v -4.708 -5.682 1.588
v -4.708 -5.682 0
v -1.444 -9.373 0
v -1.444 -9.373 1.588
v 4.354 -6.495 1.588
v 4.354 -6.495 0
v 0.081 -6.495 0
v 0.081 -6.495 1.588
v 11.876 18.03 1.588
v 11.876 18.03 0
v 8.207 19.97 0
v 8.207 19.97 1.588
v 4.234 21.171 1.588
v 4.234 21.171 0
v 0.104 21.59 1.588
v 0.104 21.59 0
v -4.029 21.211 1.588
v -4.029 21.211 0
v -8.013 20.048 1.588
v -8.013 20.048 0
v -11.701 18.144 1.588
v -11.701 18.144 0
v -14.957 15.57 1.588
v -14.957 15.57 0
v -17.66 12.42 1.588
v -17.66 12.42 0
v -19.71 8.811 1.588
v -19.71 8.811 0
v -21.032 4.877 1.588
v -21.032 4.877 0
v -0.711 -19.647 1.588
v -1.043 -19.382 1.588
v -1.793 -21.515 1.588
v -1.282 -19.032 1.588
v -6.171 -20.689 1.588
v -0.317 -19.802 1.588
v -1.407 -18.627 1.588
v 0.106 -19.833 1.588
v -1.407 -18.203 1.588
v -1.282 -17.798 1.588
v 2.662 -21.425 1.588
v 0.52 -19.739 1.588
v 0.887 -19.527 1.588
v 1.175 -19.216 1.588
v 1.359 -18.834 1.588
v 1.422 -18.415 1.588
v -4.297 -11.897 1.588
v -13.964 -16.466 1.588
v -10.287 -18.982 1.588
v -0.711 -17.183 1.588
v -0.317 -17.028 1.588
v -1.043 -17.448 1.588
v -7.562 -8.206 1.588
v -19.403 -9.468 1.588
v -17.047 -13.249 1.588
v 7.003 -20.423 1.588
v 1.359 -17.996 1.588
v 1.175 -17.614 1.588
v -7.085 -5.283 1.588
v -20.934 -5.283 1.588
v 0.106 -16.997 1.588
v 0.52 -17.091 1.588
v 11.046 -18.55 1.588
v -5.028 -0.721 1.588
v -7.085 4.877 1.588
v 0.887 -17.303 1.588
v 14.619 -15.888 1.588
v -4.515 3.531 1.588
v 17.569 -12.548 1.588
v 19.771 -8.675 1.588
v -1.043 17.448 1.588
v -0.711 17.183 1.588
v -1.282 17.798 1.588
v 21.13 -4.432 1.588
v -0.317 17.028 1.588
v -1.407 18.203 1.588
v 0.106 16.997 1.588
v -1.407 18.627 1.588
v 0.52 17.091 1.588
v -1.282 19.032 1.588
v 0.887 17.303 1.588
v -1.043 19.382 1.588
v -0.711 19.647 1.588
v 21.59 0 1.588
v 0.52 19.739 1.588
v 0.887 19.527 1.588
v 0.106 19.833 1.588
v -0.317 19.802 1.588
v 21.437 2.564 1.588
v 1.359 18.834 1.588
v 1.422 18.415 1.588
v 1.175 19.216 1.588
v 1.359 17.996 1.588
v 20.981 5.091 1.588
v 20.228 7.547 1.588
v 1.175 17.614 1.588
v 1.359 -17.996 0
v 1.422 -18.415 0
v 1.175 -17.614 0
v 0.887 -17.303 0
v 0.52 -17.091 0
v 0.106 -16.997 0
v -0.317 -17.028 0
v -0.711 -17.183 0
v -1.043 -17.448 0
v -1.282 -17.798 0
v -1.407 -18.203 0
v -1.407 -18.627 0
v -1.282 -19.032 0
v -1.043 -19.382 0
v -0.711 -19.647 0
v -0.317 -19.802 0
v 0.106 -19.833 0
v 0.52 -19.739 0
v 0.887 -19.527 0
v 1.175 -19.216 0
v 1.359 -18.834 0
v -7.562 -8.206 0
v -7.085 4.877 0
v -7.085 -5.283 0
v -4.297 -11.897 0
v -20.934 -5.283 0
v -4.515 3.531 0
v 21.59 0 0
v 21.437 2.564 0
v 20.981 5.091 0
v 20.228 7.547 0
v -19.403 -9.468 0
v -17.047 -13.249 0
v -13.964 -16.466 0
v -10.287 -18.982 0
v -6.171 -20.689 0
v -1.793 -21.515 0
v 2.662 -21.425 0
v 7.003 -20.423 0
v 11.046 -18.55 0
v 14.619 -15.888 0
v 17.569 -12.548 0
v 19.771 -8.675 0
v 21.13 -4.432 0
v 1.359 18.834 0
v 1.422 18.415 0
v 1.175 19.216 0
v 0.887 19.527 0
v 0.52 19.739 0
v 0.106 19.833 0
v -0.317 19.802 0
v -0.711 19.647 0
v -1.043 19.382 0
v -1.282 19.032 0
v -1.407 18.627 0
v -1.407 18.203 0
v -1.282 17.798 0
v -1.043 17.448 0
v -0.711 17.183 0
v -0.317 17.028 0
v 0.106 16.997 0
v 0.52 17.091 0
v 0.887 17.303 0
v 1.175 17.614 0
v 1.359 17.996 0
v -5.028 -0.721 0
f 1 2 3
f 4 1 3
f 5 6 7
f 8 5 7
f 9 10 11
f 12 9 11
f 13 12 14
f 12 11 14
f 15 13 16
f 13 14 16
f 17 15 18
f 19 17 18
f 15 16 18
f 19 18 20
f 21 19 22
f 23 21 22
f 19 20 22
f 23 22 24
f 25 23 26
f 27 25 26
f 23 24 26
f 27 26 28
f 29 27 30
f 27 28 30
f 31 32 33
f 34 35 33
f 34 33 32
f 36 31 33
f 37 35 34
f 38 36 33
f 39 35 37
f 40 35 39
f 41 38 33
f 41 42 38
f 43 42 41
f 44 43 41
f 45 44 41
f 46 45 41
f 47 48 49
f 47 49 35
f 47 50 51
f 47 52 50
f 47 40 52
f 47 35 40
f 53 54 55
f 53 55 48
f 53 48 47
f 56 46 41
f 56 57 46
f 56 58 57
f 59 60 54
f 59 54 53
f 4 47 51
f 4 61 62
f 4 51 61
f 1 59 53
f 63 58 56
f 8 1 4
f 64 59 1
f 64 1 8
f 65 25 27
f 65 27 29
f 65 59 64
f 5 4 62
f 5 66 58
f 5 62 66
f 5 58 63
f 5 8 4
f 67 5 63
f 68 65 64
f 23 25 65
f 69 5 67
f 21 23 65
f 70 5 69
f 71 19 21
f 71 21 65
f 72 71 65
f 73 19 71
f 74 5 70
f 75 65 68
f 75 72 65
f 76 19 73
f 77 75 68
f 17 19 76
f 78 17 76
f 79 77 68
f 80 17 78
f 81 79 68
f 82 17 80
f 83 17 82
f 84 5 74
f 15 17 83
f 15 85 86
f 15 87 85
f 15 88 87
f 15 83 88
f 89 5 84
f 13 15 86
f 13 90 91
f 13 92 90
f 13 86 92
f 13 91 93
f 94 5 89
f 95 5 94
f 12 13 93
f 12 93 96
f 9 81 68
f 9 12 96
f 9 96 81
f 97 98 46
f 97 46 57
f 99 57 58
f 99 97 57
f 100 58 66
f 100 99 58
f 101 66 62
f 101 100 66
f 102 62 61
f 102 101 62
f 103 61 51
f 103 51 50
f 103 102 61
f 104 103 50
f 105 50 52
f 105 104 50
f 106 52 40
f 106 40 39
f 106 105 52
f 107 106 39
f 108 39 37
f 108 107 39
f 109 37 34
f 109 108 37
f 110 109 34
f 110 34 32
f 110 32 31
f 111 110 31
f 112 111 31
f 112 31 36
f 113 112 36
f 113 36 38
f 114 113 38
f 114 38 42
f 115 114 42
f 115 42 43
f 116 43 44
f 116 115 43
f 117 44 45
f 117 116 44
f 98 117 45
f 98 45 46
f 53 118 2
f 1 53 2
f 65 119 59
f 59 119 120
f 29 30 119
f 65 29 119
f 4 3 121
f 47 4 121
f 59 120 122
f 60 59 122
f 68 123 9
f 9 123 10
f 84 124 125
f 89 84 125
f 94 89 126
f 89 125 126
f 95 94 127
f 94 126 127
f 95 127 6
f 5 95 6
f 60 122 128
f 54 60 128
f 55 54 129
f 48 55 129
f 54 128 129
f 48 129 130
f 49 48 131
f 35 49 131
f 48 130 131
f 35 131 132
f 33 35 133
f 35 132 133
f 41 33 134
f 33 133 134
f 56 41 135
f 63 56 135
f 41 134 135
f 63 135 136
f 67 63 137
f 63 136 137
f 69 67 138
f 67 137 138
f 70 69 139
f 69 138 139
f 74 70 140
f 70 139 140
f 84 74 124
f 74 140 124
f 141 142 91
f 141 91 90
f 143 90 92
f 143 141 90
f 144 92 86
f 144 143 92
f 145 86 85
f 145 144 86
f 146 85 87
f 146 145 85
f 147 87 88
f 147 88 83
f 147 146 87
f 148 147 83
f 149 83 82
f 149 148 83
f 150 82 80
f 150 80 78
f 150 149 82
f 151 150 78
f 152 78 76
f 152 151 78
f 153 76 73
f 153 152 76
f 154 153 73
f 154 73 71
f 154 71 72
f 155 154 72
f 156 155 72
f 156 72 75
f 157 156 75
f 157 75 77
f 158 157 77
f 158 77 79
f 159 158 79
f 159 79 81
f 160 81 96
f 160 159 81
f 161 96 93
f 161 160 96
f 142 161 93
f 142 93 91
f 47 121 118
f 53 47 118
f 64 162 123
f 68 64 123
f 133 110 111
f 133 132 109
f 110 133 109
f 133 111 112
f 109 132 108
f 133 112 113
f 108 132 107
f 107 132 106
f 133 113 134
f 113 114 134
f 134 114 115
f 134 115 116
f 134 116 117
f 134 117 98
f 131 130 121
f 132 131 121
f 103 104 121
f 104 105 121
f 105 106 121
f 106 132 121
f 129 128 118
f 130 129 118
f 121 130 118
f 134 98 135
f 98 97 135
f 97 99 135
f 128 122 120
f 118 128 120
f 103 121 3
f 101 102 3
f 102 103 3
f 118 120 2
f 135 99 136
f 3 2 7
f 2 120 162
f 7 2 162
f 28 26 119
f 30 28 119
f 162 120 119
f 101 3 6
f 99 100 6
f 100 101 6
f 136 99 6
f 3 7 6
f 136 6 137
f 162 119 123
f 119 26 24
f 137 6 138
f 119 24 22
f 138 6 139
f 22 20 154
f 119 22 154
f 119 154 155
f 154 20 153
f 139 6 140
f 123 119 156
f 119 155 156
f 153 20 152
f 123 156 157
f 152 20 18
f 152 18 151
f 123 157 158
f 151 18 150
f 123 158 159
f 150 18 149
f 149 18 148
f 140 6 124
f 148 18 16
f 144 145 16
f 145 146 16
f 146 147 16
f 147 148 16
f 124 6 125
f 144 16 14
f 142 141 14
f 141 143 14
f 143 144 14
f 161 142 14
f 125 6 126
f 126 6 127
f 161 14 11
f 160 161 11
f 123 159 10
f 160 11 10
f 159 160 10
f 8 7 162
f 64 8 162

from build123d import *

# Parameters (mm, degrees)
SKETCH1_R           = 1.4224
BOSS_EXTRUDE1_DEPTH = 1.5875


with BuildPart() as part:
    # Sketch1 → Boss-Extrude1 (new body)
    with BuildSketch(Plane.XY):
        with BuildLine():
            Line((-5.027565338, -0.720652536), (-4.515281158, 3.5306))
            Line((-4.515281158, 3.5306), (11.876076152, 18.030166811))
            ThreePointArc((11.876076152, 18.030166811), (-8.013144755, 20.047882959), (-21.031997569, 4.8768))
            Line((-21.031997569, 4.8768), (-7.084965338, 4.8768))
            Line((-7.084965338, 4.8768), (-7.084965338, -5.2832))
            Line((-7.084965338, -5.2832), (-20.933606898, -5.2832))
            ThreePointArc((-20.933606898, -5.2832), (2.661909754, -21.425273311), (21.59, 0))
            ThreePointArc((21.59, 0), (21.246782402, 3.834362733), (20.228041911, 7.546815251))
            Line((20.228041911, 7.546815251), (4.353635591, -6.495463901))
            Line((4.353635591, -6.495463901), (0.080752517, -6.495463901))
            Line((0.080752517, -6.495463901), (-5.027565338, -0.720652536))
        make_face()
        with Locations((0, -18.415)):
            Circle(SKETCH1_R, mode=Mode.SUBTRACT)
        Polygon((-7.562063797, -8.206208525), (-4.708345419, -5.681848919), (-1.443506996, -9.372658021), (-4.297225374, -11.897017627), align=None, mode=Mode.SUBTRACT)
        with Locations((0, 18.415)):
            Circle(SKETCH1_R, mode=Mode.SUBTRACT)
    extrude(amount=BOSS_EXTRUDE1_DEPTH)


solid = part.part
